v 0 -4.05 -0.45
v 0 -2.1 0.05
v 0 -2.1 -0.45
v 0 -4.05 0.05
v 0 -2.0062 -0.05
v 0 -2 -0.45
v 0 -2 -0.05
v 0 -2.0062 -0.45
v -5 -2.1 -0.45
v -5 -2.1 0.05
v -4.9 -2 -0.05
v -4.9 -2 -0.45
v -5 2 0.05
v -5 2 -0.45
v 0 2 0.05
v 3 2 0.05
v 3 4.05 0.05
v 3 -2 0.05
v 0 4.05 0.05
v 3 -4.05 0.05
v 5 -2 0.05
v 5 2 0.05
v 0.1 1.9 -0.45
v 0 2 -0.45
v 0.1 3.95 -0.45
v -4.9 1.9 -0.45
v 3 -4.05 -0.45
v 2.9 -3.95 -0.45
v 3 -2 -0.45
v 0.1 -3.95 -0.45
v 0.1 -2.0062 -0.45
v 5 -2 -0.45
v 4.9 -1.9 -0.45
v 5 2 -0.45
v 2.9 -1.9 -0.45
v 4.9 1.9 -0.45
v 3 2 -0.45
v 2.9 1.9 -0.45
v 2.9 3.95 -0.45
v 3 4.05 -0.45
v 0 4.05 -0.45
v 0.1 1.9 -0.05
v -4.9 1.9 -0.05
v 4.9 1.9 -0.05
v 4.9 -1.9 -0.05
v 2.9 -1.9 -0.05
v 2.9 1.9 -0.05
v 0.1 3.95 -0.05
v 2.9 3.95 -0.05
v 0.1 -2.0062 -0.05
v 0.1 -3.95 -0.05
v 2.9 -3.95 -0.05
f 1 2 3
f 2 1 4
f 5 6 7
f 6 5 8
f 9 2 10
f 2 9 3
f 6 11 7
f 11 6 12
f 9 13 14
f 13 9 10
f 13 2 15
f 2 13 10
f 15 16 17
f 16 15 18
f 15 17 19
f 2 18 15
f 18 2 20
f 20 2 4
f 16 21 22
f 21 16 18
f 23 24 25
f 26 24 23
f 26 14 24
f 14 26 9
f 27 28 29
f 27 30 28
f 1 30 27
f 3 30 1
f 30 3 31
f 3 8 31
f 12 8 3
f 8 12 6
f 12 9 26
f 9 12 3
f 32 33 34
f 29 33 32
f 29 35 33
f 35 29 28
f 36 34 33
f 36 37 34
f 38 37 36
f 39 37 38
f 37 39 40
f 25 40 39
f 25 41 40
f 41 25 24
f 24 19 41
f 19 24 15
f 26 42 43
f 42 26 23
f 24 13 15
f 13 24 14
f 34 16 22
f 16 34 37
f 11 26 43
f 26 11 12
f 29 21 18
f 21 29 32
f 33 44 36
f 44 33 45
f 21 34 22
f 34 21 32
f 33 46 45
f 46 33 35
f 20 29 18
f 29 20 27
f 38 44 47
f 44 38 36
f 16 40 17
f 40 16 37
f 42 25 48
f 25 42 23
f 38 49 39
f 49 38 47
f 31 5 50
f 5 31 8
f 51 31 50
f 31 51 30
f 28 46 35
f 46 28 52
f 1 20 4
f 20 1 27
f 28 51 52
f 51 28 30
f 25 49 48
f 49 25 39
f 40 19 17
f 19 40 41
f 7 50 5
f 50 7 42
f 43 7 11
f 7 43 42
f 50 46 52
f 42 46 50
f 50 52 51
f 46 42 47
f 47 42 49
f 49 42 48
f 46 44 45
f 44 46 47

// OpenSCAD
l = 10;
w = 4;
h = 4;
wr_l = 3;
wr_w = 2;
pr_h = 10;
t = 0.1;
w_disp = 2;
c_h = 0.5;
pos = 0 || 1;
module bed(length,width){
    cube([length, width, t], true);
    }
module wing(pos){
    if(wr_l < l-w_disp){
        if(pos == 1){
        translate([((l-wr_l)/2)-w_disp,((wr_w+w)/2),0]){
            bed(wr_l,wr_w);
            }
            }else if(pos == 0){
                translate([(((l-wr_l)/2)-w_disp),-((wr_w+w)/2),0]){
            bed(wr_l,wr_w);
            }
  }
 }
}
module holder_downer(){
    bed(l,w);
    wing(1);wing(0);
    rotate([90,0,0]){
        translate([-l/4,(-c_h/2)+t/2,(w/2)+t/2])bed(l-(w_disp+wr_l),c_h);
        translate([-l/4,(-c_h/2)+t/2,(-w/2)+t/2]) bed(l-(w_disp+wr_l),c_h);
        rotate([0,90,0]) translate([0,-(c_h-t)/2,(-l/2)+t/2]) bed(w,c_h);
        rotate([0,-90,0]) translate([0,-(c_h-t)/2,(-l/2)+t/2]) bed(w,c_h);
        translate([(wr_l+(w_disp/2)),-(c_h-t)/2,(w-t)/2])bed(w_disp,c_h);  
        translate([wr_l+(w_disp/2),-(c_h-t)/2,-(w-t)/2])bed(w_disp,c_h);
        rotate([0,90,0]) translate([(w+wr_w-(t))/2,-(c_h-t)/2,t/2]) bed(wr_w+t,c_h);
        translate([wr_l-t,0,0])rotate([0,90,0]) translate([(w+wr_w-(t))/2,-(c_h-t)/2,t/2]) bed(wr_w+t,c_h);
        rotate([0,90,0]) translate([-(w+wr_w+(t/8))/2,-(c_h-t)/2,t/2]) bed(wr_w,c_h);
        translate([(wr_l-t),0,0])rotate([0,90,0]) translate([-(w+wr_w-(t))/2,-(c_h-t)/2,t/2]) bed(wr_w+t,c_h);
        translate([wr_l/2,-(c_h-t)/2,(w/2)+wr_w]) bed(wr_l,c_h);
        translate([wr_l/2,-(c_h-t)/2,-((w/2)+wr_w)]) bed(wr_l,c_h);
    }}
holder_downer();
